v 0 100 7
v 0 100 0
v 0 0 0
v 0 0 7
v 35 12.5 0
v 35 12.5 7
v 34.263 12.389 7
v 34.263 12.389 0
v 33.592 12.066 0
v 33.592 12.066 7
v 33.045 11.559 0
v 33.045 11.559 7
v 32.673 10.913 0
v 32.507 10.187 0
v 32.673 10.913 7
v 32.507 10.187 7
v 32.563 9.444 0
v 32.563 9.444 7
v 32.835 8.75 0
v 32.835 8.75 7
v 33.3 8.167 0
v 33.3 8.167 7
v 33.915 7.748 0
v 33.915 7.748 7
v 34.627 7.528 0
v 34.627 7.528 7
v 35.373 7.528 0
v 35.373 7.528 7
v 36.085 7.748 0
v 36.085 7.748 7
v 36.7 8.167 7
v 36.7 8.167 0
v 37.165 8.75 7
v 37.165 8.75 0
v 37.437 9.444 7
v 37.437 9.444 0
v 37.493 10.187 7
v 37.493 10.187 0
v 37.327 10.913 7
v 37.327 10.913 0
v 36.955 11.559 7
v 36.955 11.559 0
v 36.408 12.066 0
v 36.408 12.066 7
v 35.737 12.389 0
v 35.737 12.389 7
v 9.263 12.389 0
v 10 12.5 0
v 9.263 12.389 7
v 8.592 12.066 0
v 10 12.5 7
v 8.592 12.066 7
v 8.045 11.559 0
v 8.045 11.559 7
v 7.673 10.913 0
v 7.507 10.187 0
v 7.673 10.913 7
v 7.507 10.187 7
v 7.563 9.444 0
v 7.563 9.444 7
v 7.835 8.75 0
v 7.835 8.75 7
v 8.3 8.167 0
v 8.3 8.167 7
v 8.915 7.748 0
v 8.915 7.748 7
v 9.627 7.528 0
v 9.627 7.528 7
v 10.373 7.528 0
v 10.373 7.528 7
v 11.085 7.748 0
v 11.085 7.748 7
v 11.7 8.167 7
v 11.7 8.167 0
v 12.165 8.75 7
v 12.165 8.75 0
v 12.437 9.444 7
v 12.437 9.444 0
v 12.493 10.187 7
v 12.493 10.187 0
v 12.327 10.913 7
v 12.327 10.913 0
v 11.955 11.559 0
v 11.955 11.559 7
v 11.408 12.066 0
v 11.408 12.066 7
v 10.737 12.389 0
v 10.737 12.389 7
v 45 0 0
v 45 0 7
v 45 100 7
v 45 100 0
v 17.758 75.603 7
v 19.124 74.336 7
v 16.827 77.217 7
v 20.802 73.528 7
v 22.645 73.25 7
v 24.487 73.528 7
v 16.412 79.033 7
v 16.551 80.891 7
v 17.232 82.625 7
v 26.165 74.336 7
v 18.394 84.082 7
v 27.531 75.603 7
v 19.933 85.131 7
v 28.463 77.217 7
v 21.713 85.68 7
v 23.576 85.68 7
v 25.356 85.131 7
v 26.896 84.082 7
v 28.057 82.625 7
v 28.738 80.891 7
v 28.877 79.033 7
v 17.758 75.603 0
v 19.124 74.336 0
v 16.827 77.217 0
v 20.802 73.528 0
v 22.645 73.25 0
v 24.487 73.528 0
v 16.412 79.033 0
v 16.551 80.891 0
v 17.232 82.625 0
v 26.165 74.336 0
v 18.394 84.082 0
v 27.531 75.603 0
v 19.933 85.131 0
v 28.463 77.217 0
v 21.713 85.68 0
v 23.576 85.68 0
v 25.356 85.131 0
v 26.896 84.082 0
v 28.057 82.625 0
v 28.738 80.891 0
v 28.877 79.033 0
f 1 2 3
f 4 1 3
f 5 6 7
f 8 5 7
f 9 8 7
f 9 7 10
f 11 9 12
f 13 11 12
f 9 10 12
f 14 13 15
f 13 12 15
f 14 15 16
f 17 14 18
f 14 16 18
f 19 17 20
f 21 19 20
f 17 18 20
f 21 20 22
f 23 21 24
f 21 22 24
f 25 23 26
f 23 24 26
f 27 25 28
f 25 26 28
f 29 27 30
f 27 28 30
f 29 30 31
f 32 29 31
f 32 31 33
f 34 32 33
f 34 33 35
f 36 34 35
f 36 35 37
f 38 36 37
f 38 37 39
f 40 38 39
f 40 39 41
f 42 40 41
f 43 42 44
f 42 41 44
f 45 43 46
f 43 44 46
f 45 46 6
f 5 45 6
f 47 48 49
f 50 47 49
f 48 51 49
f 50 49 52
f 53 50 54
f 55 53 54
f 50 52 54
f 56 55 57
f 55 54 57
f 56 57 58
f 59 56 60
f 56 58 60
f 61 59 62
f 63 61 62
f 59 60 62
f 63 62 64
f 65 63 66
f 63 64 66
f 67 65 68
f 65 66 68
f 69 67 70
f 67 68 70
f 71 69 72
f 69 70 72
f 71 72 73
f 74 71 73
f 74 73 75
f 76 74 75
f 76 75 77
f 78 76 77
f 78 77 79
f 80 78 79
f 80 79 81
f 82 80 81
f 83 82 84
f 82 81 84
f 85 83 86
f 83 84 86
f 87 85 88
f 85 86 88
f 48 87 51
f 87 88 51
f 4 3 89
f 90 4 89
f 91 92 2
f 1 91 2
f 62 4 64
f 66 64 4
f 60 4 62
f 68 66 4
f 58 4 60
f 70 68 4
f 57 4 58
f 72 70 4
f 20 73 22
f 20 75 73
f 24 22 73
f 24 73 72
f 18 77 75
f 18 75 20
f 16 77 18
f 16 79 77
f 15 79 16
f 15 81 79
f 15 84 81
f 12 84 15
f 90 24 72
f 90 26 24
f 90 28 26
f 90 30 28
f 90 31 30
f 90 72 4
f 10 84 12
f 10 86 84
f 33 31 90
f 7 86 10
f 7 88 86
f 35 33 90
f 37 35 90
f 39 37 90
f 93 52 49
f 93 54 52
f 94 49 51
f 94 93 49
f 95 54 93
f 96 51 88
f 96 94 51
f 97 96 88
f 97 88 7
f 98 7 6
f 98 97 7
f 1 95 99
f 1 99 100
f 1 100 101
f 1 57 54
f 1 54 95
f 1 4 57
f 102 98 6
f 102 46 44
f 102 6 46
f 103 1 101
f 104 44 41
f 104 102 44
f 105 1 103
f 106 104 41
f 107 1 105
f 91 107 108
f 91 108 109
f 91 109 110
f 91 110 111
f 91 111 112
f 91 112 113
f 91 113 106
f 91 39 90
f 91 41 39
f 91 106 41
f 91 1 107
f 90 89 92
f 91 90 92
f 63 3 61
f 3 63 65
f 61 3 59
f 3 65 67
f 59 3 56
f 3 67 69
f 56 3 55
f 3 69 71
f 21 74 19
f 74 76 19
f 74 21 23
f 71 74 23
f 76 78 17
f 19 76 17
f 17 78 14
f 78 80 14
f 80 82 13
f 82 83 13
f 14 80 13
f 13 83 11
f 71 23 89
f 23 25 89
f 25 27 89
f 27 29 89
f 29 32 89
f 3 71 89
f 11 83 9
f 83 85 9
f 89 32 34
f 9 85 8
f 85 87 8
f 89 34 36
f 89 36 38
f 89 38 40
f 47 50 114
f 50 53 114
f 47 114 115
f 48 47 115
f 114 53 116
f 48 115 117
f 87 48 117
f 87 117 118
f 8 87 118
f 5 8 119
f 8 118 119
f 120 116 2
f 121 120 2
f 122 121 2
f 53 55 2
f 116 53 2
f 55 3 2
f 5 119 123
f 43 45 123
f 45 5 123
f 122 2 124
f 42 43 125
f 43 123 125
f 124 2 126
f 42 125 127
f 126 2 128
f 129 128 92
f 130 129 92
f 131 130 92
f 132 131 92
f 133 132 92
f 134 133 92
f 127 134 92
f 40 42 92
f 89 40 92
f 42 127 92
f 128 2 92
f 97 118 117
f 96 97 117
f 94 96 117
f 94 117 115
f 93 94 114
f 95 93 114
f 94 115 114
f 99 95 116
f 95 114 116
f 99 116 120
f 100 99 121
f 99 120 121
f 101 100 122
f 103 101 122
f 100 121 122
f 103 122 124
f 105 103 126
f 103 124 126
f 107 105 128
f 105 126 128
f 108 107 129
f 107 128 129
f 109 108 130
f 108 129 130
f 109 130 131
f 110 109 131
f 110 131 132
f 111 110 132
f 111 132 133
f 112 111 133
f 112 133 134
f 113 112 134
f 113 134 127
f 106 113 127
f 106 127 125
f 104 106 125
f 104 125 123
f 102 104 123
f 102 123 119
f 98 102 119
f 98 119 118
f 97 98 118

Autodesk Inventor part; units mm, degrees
ref_plane "YZ Plane" through (0, 0, 0) normal (1, 0, 0) x (0, 1, 0)
ref_plane "XZ Plane" through (0, 0, 0) normal (0, 1, 0) x (-1, 0, 0)
ref_plane "XY Plane" through (0, 0, 0) normal (0, 0, 1) x (1, 0, 0)
sketch "スケッチ1" plane through (0, 0, 0) normal (0, 0, 1) x (1, 0, 0)
  line L0 (0, 0) -> (45, 0)
  line L1 (45, 0) -> (45, 100)
  line L2 (45, 100) -> (0, 100)
  line L3 (0, 100) -> (0, 0)
  dimension "d0" = 100
  dimension "d1" = 45
extrude "押し出し1" add sketch "スケッチ1" along normal blind 7
sketch "スケッチ2" plane through (0, 0, 7) normal (0, 0, 1) x (1, 0, 0)
  line L0 (0, 0) -> (45, 0) projected
  point P0 (22.6447, 79.5)
  dimension "d4" = 79.5
hole "穴1" at (22.6447, 79.5, 7) direction (0, 0, -1) diameter 12.5 end through all
sketch "スケッチ3" plane through (0, 0, 0) normal (0, 0, -1) x (-1, 0, 0)
  line L0 (0, 0) -> (-45, 0) projected
  line L1 (-45, 0) -> (-45, 100) projected
  line L2 (0, 100) -> (0, 0) projected
  point P0 (-10, 10)
  point P1 (-35, 10)
  dimension "d12" = 10
  dimension "d13" = 10
  dimension "d14" = 10
  dimension "d15" = 10
hole "穴2" at (10, 10, 0) at (35, 10, 0) direction (0, 0, 1) diameter 5 end through all
sketch "スケッチ4" plane through (0, 0, 0) normal (0, 0, -1) x (-1, 0, 0)
  point P0 (0, 0)
properties part number "回転軸取り付け板"
